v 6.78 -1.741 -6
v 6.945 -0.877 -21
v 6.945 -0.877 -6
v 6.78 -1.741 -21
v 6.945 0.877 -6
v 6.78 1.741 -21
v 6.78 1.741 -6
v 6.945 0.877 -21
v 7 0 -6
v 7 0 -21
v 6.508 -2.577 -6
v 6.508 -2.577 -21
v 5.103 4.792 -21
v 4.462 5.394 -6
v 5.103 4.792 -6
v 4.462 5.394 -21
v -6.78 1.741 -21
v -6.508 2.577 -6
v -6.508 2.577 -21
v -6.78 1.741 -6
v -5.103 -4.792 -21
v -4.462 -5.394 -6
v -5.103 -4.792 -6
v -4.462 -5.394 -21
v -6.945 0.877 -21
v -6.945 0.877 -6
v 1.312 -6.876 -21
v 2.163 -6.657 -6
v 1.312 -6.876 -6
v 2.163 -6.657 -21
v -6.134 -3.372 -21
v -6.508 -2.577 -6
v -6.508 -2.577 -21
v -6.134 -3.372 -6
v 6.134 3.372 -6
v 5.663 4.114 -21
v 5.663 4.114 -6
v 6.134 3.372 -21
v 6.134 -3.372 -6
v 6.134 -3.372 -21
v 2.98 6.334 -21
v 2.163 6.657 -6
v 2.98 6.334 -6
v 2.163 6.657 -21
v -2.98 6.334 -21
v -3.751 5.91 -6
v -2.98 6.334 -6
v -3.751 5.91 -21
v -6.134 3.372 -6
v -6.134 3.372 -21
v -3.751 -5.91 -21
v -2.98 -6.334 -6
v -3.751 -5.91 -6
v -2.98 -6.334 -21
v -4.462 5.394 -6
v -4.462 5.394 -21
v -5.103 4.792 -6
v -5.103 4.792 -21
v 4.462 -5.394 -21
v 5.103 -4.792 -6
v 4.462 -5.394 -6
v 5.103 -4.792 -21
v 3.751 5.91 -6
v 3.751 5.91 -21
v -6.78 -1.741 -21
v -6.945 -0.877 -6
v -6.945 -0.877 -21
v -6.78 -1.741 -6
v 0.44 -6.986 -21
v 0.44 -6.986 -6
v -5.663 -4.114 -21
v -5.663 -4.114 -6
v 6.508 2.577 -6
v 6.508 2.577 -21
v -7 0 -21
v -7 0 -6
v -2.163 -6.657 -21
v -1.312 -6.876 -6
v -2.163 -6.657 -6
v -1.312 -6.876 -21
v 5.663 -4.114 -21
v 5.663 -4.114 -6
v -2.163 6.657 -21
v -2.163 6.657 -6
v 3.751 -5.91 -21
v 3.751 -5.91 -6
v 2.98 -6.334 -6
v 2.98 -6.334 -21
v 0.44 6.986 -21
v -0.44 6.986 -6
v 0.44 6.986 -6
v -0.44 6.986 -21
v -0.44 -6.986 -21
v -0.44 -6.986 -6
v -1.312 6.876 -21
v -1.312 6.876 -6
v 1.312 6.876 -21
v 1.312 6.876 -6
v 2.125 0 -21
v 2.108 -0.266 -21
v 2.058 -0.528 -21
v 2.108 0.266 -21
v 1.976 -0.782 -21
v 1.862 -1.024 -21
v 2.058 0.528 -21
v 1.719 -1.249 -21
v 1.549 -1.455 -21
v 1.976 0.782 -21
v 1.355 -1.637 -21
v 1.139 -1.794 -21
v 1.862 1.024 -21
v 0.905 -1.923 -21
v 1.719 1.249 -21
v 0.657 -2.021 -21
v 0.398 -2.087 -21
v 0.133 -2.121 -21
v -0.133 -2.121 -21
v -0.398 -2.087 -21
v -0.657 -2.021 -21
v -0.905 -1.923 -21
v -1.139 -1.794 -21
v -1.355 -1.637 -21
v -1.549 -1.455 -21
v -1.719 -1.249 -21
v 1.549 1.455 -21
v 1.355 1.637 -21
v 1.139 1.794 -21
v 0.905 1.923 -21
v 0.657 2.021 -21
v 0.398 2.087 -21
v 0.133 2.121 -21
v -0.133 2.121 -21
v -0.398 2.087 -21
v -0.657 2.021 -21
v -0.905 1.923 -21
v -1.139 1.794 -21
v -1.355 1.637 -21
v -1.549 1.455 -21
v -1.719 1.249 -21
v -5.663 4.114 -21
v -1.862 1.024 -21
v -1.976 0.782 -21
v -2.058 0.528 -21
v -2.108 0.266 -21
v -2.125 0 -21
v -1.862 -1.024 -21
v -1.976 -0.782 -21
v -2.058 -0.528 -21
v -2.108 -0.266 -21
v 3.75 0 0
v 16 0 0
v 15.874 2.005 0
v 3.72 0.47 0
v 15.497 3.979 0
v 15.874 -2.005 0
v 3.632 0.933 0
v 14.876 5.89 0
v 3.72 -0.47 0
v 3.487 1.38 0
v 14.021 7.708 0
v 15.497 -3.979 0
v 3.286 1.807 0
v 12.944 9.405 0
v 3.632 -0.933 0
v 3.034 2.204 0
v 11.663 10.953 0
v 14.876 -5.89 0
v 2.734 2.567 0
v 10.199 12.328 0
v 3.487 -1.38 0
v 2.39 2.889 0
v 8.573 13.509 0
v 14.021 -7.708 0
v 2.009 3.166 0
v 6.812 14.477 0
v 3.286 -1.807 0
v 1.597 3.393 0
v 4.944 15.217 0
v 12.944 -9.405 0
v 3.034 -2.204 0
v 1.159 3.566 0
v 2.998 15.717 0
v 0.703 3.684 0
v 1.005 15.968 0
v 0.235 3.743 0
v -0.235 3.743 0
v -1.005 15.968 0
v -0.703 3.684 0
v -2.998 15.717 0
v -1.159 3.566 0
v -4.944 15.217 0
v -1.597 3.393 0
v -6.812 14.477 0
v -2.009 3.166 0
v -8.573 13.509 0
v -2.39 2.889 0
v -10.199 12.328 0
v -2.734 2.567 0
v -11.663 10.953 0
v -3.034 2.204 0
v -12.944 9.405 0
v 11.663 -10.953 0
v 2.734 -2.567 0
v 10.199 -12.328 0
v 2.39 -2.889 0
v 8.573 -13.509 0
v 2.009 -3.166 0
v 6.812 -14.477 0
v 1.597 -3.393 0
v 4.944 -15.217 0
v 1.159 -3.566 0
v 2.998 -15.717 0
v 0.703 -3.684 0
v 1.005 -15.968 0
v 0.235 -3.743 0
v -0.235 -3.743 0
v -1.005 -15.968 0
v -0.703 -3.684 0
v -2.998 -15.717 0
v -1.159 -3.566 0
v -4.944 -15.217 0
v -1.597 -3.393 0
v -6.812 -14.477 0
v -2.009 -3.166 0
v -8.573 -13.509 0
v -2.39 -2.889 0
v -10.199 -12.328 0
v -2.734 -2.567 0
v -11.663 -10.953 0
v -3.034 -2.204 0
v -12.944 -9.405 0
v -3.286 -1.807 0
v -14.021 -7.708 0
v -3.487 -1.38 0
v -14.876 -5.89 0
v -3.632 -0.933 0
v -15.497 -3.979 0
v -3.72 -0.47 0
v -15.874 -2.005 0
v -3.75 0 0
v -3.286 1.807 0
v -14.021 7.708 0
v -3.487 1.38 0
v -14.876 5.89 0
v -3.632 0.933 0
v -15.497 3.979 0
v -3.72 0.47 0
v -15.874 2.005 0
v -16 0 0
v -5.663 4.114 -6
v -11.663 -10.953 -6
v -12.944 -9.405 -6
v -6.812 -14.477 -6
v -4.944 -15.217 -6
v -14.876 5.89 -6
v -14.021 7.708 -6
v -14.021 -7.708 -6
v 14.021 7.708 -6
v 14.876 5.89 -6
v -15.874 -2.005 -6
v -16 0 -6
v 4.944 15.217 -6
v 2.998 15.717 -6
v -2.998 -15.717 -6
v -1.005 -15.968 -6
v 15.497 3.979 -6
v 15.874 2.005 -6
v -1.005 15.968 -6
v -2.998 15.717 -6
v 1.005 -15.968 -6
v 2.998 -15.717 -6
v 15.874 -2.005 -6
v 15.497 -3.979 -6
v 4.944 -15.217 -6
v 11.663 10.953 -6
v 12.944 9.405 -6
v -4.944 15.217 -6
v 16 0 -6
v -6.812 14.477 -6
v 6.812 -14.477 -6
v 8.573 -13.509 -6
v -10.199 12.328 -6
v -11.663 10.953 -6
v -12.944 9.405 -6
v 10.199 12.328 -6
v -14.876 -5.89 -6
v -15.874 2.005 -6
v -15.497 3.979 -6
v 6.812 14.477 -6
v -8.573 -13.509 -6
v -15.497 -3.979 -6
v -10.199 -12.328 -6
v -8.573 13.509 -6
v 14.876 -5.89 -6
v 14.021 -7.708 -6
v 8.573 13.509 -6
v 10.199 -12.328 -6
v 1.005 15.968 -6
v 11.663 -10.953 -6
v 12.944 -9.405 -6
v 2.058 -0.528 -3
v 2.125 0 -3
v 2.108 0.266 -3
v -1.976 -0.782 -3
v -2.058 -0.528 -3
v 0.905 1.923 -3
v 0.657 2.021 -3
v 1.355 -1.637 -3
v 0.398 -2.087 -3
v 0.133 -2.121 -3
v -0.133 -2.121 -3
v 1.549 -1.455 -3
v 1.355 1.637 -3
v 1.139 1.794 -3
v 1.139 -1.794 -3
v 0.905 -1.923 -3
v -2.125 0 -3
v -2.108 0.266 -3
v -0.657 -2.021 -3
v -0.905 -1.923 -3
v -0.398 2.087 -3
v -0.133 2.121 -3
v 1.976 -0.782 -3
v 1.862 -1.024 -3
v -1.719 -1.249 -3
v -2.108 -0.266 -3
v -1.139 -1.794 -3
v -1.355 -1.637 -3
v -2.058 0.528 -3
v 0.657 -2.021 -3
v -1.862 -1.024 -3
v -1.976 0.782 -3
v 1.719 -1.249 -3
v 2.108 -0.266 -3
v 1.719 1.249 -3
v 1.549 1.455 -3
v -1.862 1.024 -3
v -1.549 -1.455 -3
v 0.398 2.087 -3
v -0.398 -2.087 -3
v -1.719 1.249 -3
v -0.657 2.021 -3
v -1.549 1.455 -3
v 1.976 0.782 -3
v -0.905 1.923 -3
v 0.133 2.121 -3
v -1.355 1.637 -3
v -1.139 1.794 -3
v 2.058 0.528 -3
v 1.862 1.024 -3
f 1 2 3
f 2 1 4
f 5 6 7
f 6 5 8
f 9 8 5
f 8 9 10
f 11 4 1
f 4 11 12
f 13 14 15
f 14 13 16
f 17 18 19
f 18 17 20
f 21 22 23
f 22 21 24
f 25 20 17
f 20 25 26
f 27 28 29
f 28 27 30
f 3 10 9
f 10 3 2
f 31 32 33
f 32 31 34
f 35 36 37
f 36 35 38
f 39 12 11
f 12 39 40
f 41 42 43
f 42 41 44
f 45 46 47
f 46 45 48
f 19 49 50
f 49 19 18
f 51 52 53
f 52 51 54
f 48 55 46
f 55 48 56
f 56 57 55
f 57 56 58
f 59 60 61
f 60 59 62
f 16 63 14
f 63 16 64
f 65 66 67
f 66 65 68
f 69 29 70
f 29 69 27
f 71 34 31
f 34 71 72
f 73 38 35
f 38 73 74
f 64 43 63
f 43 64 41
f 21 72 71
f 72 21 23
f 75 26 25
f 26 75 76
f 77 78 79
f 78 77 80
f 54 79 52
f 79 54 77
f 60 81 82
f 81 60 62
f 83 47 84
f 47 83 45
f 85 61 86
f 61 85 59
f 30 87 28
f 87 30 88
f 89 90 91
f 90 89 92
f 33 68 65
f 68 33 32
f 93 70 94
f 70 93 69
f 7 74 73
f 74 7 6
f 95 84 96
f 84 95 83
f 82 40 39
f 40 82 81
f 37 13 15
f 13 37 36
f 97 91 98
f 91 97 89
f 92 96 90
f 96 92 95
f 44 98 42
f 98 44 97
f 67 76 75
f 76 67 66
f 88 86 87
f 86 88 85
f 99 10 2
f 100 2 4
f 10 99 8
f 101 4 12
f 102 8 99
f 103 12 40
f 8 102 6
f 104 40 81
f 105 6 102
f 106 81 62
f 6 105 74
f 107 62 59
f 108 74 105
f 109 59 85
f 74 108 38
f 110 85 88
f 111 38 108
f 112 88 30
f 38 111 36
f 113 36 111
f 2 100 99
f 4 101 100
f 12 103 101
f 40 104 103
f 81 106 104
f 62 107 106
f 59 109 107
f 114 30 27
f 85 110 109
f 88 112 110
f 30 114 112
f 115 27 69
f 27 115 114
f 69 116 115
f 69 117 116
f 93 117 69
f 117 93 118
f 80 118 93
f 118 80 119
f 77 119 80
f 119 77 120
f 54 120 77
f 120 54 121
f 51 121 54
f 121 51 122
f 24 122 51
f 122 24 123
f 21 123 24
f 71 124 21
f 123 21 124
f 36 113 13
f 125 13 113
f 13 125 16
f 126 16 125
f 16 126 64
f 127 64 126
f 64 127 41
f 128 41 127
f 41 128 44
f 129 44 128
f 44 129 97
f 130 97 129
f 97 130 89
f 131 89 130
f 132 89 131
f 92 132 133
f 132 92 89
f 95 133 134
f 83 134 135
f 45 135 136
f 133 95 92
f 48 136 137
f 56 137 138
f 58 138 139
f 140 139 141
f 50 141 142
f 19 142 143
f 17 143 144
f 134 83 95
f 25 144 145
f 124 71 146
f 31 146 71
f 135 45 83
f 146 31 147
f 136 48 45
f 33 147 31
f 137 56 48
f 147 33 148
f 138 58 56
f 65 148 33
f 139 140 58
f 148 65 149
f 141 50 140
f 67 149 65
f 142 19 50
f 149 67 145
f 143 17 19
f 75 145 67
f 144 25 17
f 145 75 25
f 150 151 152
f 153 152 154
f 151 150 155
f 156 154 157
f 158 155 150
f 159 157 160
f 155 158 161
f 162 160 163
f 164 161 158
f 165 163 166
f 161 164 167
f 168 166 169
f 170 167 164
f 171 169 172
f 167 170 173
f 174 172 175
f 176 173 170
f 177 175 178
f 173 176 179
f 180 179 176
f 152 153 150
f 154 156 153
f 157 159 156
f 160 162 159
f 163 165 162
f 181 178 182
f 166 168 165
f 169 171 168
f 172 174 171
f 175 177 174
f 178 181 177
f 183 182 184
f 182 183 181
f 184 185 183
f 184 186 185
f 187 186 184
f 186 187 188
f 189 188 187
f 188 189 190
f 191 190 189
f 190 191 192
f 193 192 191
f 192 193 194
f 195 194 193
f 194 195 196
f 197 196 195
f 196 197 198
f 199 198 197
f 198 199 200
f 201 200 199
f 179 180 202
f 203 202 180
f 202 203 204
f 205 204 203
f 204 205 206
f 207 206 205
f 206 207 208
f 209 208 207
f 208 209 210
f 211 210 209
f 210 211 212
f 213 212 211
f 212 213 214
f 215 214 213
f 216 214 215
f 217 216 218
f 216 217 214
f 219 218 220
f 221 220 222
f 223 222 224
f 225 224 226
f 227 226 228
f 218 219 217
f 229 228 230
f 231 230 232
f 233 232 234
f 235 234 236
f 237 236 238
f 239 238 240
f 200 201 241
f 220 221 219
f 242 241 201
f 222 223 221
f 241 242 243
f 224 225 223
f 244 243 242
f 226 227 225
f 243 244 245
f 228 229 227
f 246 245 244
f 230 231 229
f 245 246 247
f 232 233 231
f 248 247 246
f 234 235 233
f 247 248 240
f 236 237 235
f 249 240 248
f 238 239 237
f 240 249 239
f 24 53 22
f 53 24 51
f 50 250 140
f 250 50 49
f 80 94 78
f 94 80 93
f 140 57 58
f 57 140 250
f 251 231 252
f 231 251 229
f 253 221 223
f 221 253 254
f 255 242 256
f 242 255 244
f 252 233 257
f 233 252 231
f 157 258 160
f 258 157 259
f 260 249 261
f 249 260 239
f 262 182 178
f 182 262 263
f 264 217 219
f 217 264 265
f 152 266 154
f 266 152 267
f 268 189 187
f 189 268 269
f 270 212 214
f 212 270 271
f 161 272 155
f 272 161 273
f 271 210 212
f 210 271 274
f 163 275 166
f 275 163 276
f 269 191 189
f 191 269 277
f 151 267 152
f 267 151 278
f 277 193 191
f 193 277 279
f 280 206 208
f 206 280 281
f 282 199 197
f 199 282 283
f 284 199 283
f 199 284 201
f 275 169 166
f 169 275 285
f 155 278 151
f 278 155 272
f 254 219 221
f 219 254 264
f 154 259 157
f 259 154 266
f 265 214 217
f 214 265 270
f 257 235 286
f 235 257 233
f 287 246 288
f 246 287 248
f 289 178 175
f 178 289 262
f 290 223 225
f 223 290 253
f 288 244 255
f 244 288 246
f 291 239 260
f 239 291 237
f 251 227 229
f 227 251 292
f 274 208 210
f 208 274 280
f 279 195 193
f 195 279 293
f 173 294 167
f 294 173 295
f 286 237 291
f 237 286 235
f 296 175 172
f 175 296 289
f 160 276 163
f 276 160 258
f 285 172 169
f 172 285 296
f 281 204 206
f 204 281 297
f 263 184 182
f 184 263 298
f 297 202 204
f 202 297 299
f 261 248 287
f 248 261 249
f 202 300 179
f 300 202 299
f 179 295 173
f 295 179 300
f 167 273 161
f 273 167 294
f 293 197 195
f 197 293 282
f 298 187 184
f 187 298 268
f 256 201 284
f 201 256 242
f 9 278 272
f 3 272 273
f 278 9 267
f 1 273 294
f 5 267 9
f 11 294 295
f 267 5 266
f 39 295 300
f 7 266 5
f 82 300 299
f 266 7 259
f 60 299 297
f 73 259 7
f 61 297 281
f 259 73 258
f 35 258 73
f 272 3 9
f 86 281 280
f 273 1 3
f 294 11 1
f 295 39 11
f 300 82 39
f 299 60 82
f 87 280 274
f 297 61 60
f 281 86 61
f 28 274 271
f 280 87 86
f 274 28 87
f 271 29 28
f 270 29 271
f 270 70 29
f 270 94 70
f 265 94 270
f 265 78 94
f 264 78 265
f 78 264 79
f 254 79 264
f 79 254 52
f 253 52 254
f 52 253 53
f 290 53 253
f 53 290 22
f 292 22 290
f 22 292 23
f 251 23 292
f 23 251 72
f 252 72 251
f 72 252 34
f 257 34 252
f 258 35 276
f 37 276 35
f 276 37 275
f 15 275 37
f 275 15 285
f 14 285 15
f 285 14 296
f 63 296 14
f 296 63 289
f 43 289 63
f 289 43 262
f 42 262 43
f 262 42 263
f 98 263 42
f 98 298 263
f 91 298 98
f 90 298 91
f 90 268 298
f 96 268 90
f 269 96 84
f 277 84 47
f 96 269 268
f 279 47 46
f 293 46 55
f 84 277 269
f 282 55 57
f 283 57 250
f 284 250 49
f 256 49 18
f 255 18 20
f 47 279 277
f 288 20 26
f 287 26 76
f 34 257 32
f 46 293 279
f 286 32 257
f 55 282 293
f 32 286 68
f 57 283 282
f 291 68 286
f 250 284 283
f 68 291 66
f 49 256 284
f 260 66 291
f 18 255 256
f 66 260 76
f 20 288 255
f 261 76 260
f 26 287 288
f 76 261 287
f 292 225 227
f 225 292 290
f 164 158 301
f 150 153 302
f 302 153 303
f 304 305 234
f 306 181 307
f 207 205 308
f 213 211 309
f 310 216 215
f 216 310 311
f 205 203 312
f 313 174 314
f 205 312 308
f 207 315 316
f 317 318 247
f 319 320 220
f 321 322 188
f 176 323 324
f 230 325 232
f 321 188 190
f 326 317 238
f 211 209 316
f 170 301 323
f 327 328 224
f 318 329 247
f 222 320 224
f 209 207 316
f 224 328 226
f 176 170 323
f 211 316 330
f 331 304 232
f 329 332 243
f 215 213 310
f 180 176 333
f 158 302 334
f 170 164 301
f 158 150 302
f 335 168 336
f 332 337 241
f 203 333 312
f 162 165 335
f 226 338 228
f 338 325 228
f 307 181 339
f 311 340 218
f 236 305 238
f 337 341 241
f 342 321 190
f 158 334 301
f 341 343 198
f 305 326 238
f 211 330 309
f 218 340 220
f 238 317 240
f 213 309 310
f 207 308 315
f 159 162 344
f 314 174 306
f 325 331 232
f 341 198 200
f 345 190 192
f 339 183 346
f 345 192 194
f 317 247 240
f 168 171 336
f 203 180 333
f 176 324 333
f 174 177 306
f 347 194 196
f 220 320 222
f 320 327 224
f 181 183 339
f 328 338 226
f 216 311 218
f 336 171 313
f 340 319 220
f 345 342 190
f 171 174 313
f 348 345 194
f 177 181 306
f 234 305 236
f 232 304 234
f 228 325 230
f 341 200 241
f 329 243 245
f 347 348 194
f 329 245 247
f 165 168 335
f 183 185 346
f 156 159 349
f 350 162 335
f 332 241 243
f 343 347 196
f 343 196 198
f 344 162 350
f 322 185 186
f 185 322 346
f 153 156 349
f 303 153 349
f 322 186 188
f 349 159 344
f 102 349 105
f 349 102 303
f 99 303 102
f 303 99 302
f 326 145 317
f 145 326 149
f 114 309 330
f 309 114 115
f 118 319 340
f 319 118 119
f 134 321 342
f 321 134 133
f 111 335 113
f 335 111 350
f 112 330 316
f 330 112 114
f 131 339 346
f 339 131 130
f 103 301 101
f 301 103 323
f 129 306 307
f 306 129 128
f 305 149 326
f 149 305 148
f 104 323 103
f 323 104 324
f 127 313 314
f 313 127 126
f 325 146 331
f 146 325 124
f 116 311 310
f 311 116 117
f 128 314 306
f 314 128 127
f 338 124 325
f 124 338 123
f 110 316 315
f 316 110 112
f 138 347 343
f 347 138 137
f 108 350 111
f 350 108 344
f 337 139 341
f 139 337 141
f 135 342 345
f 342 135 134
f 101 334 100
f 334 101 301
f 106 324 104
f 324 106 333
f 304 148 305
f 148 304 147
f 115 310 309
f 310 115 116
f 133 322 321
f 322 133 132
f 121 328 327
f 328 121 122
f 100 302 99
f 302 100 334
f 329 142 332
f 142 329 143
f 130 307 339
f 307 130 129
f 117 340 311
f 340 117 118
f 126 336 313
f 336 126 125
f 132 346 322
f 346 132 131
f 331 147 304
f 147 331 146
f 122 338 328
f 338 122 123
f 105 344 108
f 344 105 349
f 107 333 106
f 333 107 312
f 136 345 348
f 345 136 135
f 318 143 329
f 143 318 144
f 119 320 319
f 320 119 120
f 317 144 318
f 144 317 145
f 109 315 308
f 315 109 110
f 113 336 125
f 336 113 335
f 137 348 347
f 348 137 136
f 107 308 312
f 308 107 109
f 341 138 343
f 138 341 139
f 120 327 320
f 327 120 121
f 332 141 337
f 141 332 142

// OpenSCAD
$fn = 50;


difference() {
	union() {
		translate(v = [0, 0, -21.0000000000]) {
			cylinder(h = 21, r = 7.0000000000);
		}
		translate(v = [0, 0, -6.0000000000]) {
			cylinder(h = 6, r = 16.0000000000);
		}
	}
	union() {
		translate(v = [0, 0, 0]) {
			rotate(a = [0, 0, 0]) {
				difference() {
					union() {
						#translate(v = [0, 0, -21.0000000000]) {
							cylinder(h = 21, r = 2.0000000000);
						}
						#translate(v = [0, 0, -3]) {
							cylinder(h = 3, r = 7.0000000000, r1 = 2.1250000000, r2 = 3.7500000000);
						}
						#translate(v = [0, 0, -21.0000000000]) {
							cylinder(h = 21, r = 2.1250000000);
						}
						#translate(v = [0, 0, -21.0000000000]) {
							cylinder(h = 21, r = 2.0000000000);
						}
					}
					union();
				}
			}
		}
	}
}
